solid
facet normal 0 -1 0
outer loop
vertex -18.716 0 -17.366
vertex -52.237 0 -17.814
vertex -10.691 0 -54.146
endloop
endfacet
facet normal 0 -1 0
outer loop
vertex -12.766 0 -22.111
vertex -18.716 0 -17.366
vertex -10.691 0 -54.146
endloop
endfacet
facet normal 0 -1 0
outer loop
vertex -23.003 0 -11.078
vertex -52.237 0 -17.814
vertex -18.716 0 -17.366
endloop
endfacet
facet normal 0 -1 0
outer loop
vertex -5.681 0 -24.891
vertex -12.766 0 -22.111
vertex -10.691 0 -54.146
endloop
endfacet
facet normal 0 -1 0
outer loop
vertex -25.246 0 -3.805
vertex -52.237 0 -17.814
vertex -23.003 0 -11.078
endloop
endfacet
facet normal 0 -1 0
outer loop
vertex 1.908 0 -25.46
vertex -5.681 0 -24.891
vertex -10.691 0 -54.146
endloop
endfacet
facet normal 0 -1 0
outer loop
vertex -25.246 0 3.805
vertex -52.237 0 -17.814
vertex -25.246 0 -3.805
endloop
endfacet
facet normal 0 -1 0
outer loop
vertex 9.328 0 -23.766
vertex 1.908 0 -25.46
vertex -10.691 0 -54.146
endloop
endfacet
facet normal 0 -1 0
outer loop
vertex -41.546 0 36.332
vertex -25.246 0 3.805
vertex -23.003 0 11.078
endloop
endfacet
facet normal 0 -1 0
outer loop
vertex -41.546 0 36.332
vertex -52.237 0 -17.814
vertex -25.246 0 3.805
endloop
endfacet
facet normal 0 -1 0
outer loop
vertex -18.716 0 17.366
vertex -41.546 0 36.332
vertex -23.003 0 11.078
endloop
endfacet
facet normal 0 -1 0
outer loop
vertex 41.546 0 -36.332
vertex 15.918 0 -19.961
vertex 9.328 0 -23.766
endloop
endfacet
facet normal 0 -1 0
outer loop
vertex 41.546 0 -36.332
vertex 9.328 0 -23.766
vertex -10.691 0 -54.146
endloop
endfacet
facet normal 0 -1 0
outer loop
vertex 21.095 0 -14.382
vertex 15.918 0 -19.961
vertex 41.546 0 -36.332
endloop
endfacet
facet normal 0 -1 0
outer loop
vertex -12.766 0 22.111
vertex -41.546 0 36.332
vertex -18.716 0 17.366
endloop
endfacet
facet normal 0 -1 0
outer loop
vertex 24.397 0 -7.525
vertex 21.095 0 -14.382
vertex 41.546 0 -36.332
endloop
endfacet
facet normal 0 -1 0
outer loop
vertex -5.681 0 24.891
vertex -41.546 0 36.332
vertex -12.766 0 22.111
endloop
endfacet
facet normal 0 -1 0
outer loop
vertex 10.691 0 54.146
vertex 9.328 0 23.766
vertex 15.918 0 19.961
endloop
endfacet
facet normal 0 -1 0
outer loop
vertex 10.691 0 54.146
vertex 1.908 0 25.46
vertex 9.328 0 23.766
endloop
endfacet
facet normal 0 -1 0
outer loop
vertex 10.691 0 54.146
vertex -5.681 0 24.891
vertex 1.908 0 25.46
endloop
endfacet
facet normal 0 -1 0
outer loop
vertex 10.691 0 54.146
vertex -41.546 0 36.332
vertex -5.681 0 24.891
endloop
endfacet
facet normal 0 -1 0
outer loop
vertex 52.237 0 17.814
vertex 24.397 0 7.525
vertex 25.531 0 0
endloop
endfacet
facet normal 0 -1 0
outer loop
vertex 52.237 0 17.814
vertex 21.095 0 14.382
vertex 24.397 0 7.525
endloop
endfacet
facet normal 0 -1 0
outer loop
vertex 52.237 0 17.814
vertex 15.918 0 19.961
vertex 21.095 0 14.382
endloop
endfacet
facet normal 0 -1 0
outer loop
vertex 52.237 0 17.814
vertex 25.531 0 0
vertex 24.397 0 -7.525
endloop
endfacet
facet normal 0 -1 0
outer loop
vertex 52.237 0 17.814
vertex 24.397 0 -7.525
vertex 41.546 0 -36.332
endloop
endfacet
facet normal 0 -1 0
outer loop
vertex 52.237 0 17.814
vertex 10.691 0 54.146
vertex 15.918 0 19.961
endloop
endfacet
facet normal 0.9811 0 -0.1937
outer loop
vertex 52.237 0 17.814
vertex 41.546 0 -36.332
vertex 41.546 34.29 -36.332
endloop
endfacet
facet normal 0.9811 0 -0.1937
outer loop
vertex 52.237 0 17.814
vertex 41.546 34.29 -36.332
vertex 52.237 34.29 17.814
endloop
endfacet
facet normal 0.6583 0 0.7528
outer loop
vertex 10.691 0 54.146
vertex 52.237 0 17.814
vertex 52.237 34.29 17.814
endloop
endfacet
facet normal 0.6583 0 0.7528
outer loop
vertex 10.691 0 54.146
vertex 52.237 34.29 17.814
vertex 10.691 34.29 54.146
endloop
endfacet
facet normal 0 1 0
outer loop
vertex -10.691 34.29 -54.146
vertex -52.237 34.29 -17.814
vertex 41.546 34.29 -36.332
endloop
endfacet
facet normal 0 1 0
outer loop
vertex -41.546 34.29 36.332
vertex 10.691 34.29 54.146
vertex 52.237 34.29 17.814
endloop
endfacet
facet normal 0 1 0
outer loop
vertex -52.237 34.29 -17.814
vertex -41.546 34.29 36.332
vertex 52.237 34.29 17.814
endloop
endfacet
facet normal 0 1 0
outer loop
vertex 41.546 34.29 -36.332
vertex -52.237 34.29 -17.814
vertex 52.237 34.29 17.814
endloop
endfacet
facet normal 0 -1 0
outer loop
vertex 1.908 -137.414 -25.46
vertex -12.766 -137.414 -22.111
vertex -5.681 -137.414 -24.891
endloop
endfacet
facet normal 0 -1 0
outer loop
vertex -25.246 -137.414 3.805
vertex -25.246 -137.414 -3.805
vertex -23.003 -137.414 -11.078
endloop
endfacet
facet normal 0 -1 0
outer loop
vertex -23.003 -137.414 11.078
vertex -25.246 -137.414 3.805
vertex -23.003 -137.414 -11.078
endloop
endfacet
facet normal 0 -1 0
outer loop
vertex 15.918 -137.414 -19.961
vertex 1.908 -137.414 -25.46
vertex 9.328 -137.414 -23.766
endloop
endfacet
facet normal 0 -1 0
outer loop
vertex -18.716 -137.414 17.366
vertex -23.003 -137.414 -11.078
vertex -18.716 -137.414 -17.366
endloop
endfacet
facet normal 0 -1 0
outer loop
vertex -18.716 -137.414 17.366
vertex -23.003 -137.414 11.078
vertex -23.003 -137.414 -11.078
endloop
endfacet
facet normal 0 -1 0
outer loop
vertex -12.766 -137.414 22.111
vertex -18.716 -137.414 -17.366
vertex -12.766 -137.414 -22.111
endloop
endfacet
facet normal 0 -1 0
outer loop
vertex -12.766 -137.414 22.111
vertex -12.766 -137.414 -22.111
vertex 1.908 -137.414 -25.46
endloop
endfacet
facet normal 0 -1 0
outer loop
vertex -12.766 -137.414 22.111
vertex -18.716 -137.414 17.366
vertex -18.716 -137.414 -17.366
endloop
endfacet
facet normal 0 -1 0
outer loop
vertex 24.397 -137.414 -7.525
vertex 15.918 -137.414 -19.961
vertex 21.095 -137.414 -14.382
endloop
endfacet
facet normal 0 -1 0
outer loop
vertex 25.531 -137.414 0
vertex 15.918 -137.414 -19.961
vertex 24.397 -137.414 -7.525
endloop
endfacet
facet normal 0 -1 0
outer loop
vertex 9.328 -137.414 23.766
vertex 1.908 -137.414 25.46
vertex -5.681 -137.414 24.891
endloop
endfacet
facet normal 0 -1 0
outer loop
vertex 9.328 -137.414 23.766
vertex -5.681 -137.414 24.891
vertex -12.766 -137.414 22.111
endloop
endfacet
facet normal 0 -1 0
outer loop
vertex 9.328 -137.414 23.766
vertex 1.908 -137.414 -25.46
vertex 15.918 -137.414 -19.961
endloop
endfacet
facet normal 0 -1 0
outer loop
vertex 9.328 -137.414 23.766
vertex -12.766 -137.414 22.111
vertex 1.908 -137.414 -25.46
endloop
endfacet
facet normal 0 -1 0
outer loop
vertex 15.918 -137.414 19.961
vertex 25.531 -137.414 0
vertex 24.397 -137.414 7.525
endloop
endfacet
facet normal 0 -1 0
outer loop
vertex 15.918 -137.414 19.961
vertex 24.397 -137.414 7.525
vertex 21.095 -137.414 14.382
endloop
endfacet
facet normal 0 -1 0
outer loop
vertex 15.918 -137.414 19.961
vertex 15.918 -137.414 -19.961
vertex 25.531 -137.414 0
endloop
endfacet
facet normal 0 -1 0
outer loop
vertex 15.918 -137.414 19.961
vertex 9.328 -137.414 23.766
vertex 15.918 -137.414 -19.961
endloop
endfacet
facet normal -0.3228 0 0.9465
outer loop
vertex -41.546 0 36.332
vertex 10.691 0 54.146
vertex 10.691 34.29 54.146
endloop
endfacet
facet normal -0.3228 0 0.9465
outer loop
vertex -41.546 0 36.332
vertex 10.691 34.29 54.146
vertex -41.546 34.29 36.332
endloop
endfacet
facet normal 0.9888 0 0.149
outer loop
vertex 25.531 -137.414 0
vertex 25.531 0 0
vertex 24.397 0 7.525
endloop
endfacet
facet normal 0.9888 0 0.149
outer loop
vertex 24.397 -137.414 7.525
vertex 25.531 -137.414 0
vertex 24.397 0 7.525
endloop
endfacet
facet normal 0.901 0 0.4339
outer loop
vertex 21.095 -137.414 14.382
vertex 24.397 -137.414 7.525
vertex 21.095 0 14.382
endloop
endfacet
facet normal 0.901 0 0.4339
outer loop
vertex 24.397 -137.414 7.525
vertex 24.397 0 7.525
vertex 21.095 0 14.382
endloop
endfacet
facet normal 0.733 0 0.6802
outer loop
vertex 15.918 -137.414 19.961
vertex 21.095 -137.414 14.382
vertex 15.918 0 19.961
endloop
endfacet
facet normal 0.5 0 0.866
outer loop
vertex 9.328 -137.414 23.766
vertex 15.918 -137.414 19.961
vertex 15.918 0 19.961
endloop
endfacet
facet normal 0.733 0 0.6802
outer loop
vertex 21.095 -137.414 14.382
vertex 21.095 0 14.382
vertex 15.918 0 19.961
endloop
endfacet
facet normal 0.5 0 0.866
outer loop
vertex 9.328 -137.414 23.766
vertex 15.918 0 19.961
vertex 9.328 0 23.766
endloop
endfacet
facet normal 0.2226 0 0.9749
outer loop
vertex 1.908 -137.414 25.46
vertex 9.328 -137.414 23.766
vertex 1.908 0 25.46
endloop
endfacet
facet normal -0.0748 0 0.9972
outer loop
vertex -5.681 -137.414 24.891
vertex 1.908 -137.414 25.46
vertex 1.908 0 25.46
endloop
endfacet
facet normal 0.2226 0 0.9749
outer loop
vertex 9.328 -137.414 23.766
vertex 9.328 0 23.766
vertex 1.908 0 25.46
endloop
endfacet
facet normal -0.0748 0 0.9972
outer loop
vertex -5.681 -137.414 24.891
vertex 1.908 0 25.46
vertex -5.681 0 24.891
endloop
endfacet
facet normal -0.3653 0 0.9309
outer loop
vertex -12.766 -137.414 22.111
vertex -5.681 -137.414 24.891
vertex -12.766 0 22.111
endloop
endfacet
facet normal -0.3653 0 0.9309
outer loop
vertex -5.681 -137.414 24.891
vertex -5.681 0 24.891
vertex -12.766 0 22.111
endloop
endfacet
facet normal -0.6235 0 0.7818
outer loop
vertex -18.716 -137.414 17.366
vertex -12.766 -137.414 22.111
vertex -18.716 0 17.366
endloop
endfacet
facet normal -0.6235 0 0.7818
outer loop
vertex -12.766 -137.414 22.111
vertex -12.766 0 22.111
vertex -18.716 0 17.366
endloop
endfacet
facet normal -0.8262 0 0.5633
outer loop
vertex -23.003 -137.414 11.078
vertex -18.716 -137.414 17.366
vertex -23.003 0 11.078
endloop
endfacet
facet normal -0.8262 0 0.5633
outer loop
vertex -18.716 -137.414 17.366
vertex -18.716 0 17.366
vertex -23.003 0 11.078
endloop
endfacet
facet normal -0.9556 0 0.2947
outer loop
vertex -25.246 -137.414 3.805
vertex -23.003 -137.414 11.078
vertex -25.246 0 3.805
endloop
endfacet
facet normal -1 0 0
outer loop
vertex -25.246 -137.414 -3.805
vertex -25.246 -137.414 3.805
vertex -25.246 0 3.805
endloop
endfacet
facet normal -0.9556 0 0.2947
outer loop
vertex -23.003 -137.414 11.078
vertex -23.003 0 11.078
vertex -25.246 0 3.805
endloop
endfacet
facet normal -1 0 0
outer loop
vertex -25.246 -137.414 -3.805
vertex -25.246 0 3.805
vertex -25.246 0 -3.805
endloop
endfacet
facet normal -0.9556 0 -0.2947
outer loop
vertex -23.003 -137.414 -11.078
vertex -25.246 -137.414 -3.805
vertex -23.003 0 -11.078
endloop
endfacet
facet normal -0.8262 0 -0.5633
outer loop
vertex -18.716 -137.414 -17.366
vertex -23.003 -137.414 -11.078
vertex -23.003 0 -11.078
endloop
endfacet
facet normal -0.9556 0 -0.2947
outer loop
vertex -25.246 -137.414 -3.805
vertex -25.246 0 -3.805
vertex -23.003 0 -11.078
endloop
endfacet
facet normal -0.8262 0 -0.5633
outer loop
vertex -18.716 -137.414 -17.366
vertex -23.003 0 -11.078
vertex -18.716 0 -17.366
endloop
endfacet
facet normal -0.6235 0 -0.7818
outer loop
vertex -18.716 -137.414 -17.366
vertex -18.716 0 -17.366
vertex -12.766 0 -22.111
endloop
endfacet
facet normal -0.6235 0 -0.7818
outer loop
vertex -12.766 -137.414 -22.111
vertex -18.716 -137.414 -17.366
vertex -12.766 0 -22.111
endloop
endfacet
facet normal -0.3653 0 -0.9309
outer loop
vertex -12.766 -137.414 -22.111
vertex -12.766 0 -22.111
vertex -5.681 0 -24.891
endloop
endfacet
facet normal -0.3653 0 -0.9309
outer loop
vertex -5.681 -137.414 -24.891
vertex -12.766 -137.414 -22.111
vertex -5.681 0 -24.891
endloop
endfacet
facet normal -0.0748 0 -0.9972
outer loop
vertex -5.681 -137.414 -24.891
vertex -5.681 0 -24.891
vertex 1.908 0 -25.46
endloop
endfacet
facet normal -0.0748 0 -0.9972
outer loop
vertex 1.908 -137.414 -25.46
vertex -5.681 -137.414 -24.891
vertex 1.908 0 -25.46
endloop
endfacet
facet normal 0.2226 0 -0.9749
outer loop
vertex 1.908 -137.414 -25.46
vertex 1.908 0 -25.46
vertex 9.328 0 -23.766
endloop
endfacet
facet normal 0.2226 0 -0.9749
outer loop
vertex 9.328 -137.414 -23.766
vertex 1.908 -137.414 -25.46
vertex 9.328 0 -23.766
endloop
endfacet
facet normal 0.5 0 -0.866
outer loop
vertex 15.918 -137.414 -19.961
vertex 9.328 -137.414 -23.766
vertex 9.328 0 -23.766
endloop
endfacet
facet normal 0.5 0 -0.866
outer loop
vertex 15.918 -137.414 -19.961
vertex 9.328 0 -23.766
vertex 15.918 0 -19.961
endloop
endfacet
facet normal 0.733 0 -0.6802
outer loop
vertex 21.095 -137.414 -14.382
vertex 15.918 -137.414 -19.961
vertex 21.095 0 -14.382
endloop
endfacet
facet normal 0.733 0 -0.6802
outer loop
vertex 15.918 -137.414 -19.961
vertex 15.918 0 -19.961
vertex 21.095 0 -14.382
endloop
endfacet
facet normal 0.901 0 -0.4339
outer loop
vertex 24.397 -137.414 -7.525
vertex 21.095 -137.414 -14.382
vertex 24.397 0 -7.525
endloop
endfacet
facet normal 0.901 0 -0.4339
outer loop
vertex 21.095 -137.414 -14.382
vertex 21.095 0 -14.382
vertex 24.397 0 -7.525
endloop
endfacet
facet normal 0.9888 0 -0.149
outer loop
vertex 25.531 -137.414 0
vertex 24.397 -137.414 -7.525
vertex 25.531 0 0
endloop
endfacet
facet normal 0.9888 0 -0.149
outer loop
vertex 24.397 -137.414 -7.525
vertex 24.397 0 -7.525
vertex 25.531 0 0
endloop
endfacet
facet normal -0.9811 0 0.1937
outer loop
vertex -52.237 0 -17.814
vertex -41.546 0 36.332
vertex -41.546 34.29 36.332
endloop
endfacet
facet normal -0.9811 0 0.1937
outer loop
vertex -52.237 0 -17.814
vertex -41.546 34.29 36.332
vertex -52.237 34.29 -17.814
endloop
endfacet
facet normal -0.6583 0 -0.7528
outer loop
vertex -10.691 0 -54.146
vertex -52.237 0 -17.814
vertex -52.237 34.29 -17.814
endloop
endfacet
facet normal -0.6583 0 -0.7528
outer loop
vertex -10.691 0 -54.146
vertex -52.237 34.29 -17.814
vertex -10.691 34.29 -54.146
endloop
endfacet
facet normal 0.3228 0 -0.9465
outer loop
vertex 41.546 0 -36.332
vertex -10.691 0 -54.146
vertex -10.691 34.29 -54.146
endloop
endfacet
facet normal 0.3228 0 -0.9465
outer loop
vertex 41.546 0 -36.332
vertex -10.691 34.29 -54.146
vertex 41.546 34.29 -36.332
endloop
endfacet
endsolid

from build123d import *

# Parameters (mm, degrees)
F1_DEPTH = 34.29
F2_R     = 25.531281
F3_DEPTH = 137.414
F4_R     = 11.71201
F5_DEPTH = 168.402


with BuildPart() as f1:
    # F0 (on Front) → F1 (new body)
    with BuildSketch(Plane.XZ):
        Polygon((52.237316, 17.813952), (10.691323, 54.145819), (-41.545993, 36.331867), (-52.237316, -17.813952), (-10.691323, -54.145819), (41.545993, -36.331867), align=None)
    extrude(amount=-F1_DEPTH)

    # F2 (on face) → F3 (join)
    with BuildSketch(Plane.XZ):
        Circle(F2_R)
    extrude(amount=F3_DEPTH)

    # F4 (on face) → F5 (join)
    with BuildSketch(Plane.XZ.offset(137.414)):
        Circle(F4_R)
    extrude(amount=-F5_DEPTH)


solid = f1.part
